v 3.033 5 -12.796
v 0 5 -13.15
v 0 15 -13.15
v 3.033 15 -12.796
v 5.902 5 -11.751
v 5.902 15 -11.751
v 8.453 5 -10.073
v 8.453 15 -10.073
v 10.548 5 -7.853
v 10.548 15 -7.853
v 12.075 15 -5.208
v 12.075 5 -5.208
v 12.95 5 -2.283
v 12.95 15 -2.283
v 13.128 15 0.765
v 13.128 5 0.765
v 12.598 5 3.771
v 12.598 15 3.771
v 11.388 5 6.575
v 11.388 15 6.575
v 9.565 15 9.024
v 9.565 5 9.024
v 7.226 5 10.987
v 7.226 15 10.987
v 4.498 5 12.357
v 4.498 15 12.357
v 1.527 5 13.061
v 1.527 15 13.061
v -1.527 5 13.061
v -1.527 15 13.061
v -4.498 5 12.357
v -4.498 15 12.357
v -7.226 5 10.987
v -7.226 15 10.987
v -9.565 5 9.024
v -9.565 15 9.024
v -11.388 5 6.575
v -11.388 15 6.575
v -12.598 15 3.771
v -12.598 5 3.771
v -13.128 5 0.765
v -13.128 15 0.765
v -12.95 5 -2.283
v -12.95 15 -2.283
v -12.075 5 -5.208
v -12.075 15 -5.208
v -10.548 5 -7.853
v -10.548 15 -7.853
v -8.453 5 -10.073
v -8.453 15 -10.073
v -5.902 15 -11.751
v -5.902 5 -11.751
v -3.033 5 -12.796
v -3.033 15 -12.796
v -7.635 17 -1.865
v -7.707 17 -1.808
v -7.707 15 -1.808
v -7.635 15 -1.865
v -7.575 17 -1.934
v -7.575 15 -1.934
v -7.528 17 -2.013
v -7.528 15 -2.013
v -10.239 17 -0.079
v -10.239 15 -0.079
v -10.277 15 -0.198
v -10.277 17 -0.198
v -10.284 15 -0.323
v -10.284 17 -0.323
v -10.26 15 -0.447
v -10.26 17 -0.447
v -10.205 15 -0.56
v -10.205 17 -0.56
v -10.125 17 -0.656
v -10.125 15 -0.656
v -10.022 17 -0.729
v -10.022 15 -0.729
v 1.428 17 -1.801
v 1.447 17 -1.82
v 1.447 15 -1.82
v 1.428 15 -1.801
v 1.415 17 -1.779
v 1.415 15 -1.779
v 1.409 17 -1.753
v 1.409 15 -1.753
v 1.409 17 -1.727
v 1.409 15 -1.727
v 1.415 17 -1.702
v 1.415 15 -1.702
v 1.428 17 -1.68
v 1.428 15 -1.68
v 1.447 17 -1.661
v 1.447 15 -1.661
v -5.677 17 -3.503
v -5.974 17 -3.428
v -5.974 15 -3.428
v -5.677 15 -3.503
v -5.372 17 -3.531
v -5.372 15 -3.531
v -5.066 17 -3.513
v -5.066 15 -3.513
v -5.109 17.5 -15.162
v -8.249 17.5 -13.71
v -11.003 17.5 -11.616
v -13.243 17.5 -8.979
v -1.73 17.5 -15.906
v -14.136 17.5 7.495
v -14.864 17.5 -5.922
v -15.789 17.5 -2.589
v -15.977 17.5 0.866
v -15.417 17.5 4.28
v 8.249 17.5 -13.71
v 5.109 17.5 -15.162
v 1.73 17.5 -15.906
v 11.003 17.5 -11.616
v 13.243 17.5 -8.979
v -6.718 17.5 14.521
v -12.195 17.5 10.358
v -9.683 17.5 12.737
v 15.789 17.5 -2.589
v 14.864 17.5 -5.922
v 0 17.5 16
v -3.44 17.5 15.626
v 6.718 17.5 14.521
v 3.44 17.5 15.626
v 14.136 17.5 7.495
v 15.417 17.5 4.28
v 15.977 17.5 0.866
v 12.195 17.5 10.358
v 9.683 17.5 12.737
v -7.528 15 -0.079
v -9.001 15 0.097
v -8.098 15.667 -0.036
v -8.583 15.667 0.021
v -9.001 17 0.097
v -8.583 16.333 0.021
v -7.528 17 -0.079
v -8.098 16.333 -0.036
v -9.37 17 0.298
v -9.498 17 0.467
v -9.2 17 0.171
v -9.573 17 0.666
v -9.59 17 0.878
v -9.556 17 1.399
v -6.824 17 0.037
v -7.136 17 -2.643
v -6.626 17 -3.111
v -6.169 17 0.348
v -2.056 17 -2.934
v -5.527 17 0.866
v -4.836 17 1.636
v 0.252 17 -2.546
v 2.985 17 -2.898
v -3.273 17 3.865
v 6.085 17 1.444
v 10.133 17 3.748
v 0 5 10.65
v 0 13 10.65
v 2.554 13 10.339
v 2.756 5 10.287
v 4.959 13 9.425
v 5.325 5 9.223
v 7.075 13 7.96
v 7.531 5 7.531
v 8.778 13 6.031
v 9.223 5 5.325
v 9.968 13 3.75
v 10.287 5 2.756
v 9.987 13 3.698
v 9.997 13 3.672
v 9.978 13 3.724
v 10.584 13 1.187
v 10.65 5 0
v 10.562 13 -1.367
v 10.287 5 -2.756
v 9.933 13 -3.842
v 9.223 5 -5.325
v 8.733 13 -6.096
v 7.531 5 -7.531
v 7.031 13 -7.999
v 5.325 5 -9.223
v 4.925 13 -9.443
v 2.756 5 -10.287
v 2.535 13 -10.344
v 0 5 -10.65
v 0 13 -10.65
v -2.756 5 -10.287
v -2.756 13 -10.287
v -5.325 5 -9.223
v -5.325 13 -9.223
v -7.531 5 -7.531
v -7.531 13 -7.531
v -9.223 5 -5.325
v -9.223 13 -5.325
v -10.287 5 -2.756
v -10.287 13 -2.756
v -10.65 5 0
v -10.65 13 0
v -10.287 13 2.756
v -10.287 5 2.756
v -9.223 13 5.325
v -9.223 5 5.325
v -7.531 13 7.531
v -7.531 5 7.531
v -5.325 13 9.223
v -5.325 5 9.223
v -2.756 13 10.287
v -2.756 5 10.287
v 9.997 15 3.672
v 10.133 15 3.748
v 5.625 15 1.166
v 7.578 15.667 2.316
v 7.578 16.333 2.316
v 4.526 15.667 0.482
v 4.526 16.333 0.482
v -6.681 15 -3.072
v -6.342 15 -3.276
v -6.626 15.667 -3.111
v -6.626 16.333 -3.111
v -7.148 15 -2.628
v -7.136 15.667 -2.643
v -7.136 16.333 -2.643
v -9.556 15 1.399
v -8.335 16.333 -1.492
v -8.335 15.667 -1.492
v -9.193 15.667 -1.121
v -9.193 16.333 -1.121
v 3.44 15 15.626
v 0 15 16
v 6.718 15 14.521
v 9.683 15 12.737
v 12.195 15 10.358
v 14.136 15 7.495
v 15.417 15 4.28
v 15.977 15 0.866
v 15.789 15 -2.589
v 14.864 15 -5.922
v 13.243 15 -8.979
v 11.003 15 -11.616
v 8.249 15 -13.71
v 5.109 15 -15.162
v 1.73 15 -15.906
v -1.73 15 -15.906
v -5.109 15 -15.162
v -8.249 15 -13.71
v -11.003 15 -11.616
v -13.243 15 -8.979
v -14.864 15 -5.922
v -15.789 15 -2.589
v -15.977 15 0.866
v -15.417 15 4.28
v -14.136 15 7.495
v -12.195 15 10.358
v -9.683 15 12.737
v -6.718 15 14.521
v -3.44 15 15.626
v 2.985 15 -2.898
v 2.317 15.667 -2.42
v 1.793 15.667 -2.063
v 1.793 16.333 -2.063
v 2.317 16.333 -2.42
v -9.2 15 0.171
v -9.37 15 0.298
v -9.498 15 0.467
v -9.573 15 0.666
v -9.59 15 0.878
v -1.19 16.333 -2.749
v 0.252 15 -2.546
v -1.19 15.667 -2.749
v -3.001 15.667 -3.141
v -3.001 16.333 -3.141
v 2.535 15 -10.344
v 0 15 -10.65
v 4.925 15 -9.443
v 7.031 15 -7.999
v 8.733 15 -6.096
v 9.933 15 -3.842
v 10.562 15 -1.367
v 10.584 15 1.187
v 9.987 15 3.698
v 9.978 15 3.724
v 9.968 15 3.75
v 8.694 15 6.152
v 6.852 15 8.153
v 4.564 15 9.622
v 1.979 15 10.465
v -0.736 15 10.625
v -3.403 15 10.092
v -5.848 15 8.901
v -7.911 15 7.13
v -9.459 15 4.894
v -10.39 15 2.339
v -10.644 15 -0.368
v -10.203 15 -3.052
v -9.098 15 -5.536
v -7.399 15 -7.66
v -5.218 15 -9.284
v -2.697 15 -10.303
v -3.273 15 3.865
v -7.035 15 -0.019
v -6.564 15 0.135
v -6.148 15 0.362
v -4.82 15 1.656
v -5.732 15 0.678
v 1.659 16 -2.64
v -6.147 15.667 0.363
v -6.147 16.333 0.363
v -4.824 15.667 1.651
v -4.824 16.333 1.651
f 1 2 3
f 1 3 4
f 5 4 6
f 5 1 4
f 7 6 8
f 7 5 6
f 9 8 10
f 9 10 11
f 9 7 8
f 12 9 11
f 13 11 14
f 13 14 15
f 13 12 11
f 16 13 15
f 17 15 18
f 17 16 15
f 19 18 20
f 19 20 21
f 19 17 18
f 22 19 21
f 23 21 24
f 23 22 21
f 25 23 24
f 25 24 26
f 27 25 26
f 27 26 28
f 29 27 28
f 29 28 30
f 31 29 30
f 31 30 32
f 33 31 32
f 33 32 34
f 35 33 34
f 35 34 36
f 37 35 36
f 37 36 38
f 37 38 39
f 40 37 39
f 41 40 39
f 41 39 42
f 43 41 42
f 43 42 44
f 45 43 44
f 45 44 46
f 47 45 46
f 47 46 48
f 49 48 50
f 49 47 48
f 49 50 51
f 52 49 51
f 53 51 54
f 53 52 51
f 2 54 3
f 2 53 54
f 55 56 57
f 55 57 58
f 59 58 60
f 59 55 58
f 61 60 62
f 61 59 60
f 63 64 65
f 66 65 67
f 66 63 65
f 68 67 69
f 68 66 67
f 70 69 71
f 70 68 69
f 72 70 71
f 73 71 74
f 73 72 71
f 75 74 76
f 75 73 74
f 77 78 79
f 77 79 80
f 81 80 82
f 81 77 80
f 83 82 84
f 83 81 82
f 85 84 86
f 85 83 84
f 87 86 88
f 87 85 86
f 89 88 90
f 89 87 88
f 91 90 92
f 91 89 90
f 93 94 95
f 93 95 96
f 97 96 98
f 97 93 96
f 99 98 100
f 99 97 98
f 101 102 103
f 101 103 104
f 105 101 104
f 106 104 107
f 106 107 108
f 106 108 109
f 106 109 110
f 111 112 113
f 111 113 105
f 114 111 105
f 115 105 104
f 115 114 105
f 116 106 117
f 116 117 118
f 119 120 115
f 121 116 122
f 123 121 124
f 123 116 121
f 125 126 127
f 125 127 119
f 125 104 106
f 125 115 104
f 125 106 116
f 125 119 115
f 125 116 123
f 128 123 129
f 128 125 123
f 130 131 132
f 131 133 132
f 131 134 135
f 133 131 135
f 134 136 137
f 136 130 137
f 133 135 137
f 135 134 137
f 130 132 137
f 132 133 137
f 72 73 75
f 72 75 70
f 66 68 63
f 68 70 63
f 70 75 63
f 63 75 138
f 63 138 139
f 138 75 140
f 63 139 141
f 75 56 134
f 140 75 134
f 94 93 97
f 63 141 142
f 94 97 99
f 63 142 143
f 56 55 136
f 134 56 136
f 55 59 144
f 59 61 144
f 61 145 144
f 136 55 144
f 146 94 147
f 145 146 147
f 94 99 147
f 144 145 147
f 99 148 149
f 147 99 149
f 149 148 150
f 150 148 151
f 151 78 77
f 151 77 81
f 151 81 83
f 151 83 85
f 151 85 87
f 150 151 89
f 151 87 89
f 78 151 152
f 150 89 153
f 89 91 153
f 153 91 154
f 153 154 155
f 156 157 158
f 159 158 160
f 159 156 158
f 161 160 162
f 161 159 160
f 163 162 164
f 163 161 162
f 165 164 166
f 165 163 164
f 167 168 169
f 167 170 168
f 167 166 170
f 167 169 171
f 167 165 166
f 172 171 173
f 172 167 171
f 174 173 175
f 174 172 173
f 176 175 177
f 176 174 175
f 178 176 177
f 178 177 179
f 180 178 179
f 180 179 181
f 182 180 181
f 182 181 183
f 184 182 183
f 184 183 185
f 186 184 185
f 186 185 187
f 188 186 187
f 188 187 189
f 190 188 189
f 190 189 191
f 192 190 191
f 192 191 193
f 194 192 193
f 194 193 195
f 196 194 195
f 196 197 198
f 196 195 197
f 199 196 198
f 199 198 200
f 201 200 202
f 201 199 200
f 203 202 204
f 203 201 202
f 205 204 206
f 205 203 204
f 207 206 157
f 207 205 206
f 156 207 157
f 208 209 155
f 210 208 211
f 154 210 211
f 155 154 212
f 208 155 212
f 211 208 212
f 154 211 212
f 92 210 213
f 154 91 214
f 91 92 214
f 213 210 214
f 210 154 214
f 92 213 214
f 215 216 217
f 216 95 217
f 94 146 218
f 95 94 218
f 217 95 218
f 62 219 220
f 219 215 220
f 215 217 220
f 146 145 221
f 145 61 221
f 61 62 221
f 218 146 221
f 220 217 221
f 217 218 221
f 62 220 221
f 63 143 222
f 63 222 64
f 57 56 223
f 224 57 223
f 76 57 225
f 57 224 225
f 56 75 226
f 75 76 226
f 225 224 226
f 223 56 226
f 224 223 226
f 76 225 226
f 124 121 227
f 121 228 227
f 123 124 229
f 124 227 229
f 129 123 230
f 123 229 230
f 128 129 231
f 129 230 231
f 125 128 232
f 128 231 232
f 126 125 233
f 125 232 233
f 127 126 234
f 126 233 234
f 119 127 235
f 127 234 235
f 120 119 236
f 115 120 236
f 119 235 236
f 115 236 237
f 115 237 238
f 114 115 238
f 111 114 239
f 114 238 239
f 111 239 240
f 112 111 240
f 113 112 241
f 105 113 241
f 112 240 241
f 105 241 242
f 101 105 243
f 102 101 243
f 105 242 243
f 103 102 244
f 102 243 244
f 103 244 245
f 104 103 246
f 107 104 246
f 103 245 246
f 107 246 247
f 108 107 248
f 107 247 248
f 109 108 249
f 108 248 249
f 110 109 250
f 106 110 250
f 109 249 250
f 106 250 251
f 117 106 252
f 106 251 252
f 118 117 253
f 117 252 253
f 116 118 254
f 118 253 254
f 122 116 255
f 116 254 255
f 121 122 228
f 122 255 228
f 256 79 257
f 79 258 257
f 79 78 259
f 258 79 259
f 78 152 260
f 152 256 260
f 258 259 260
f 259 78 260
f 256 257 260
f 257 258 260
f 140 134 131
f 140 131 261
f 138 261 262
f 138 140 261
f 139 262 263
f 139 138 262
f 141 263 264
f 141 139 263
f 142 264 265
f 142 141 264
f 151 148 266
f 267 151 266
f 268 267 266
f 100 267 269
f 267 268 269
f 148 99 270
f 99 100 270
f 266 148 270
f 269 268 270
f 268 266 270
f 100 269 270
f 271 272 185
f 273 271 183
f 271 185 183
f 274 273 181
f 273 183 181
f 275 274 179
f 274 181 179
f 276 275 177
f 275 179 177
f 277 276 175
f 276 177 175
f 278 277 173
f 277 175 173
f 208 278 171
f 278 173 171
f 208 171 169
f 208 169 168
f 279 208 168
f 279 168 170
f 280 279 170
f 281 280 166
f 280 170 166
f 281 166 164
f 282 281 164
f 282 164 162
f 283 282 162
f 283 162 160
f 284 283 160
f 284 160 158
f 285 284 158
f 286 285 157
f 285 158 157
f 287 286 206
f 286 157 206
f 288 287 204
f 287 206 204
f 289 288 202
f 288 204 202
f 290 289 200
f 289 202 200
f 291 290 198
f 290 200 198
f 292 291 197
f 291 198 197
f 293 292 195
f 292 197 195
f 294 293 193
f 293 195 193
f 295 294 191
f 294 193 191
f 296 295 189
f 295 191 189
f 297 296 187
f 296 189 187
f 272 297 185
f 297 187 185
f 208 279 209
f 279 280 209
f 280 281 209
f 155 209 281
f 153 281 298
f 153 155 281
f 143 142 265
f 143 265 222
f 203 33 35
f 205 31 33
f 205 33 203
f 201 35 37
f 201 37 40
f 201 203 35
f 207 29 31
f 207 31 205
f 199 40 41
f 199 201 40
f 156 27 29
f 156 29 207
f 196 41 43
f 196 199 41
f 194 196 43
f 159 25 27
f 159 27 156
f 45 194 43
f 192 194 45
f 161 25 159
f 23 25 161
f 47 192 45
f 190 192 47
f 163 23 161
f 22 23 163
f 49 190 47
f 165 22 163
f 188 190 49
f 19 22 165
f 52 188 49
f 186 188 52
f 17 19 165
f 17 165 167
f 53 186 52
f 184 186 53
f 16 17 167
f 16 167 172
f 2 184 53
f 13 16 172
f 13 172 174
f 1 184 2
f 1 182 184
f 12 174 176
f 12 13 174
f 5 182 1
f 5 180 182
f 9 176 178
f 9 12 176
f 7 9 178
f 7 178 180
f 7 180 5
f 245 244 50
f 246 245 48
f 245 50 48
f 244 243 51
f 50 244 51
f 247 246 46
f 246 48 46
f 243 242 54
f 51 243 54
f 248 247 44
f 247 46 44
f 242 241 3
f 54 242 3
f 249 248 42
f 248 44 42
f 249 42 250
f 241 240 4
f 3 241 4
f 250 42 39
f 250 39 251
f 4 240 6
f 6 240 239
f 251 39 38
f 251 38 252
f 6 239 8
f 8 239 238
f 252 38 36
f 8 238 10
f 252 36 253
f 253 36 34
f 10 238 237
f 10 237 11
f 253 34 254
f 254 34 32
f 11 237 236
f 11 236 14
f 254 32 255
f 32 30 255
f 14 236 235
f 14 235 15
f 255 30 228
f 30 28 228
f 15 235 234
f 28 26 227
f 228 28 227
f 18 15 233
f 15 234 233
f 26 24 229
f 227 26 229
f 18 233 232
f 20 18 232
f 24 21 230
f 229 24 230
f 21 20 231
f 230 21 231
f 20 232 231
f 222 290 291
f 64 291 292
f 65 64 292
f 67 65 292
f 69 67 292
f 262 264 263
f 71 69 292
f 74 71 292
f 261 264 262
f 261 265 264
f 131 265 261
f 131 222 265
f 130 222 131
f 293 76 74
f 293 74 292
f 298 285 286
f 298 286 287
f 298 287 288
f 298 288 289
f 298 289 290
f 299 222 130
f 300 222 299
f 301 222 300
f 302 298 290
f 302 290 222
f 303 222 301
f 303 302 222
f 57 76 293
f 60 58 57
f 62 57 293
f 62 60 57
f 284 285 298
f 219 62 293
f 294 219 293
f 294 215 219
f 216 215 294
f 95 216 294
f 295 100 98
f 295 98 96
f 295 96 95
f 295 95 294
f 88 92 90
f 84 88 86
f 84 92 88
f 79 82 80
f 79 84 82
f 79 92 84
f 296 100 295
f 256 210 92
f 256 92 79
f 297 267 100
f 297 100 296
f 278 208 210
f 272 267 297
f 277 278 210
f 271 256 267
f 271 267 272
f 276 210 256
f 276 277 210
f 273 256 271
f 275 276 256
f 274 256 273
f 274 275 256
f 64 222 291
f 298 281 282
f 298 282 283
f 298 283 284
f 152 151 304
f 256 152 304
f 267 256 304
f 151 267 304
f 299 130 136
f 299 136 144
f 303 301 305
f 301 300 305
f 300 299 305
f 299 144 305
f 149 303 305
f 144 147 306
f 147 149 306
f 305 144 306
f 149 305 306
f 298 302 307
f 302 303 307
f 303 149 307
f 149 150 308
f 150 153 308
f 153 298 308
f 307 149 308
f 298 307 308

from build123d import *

# Parameters (mm, degrees)
SKETCH1_R           = 12.65
SKETCH1_R_2         = 10.65
BOSS_EXTRUDE1_DEPTH = 15
SKETCH2_R           = 16
BOSS_EXTRUDE2_DEPTH = 2
CUT_EXTRUDE2_DEPTH  = 3.3
SKETCH5_R           = 16
BOSS_EXTRUDE4_DEPTH = 0.5
SKETCH7_R           = 13.15
SKETCH7_R_2         = 12.65
BOSS_EXTRUDE5_DEPTH = 15
BOSS_EXTRUDE6_DEPTH = 2
SKETCH10_R          = 13.15
CUT_EXTRUDE3_DEPTH  = 5
SKETCH11_R          = 10.65
CUT_EXTRUDE4_DEPTH  = 2


with BuildPart() as part:
    # Sketch1 → Boss-Extrude1 (new body)
    with BuildSketch(Plane(origin=(0, 0, 0), x_dir=(1, 0, 0), z_dir=(0, 1, 0))):
        with Locations(Location((0, 0, 0), (0, 0, 270))):
            Circle(SKETCH1_R)
        with Locations(Location((0, 0, 0), (0, 0, 270))):
            Circle(SKETCH1_R_2, mode=Mode.SUBTRACT)
    extrude(amount=BOSS_EXTRUDE1_DEPTH)

    # Sketch2 → Boss-Extrude2 (add)
    with BuildSketch(Plane(origin=(0, 15, 0), x_dir=(1, 0, 0), z_dir=(0, 1, 0))):
        with Locations(Location((0, 0, 0), (0, 0, 270))):
            Circle(SKETCH2_R)
    extrude(amount=BOSS_EXTRUDE2_DEPTH)

    # Sketch4 → Cut-Extrude2 (cut)
    with BuildSketch(Plane(origin=(0, 17, 0), x_dir=(1, 0, 0), z_dir=(0, 1, 0))):
        with BuildLine():
            ThreePointArc((-7.706902754, 1.808391197), (-7.603132783, 1.898306548), (-7.527733553, 2.013058165))
            add(Edge.make_bspline(
                [(-5.973562898, 3.427644412), (-6.705514393, 3.181828062), (-7.188037686, 2.727956598), (-7.527733553, 2.013058165)],
                knots=[0.175947617, 0.175947617, 0.175947617, 0.175947617, 0.967261409, 0.967261409, 0.967261409, 0.967261409], degree=3))
            ThreePointArc((-5.973562898, 3.427644412), (-5.5249107, 3.522844059), (-5.066368092, 3.513333887))
            add(Edge.make_bspline(
                [(0.252246957, 2.546498923), (-0.967265157, 2.585544634), (-2.911735898, 3.219251878), (-5.066368092, 3.513333887)],
                knots=[0, 0, 0, 0, 0.944652434, 0.944652434, 0.944652434, 0.944652434], degree=3))
            add(Edge.make_bspline(
                [(2.984843767, 2.898010668), (1.699544821, 2.557369315), (0.252246957, 2.546498923)],
                knots=[0, 0, 0, 1, 1, 1], degree=2))
            add(Edge.make_bspline(
                [(1.446576088, 1.819612756), (1.692233604, 2.009446504), (2.255675441, 2.356061237), (2.984843767, 2.898010668)],
                knots=[0.144955644, 0.144955644, 0.144955644, 0.144955644, 1, 1, 1, 1], degree=3))
            ThreePointArc((1.446576088, 1.819612756), (1.407722351, 1.740462389), (1.446612546, 1.661329929))
            add(Edge.make_bspline(
                [(10.133171434, -3.748192499), (7.984235622, -2.549090336), (4.381903984, -0.604779848), (1.446612546, 1.661329929)],
                knots=[0.010904337, 0.010904337, 0.010904337, 0.010904337, 1, 1, 1, 1], degree=3))
            Line((10.133171434, -3.748192499), (-3.273421479, -3.865089106))
            add(Edge.make_bspline(
                [(-7.527733553, 0.078549357), (-6.021351328, 0.034537537), (-5.034172952, -1.161131544), (-3.273421479, -3.865089106)],
                knots=[0, 0, 0, 0, 1, 1, 1, 1], degree=3))
            add(Edge.make_bspline(
                [(-9.001359598, -0.096644929), (-8.609511327, -0.010984191), (-8.147442934, 0.043060836), (-7.527733553, 0.078549357)],
                knots=[0.366671919, 0.366671919, 0.366671919, 0.366671919, 1, 1, 1, 1], degree=3))
            ThreePointArc((-9.001359598, -0.096644929), (-9.440291534, -0.378150341), (-9.589622684, -0.877756935))
            Line((-9.589622684, -0.877756935), (-9.555879634, -1.399381307))
            Line((-9.555879634, -1.399381307), (-10.239201334, 0.078549357))
            ThreePointArc((-10.239201334, 0.078549357), (-10.259690649, 0.446534823), (-10.022461777, 0.728590805))
            add(Edge.make_bspline(
                [(-7.706902754, 1.808391197), (-8.132820465, 1.531622413), (-9.295077766, 1.120365549), (-10.022461777, 0.728590805)],
                knots=[0.10934646, 0.10934646, 0.10934646, 0.10934646, 0.840811763, 0.840811763, 0.840811763, 0.840811763], degree=3))
        make_face()
        with BuildLine():
            add(Edge.make_bspline(
                [(-6.583224352, 1.672229032), (-6.265045802, 1.812995825), (-5.554174981, 1.756337096)],
                knots=[0, 0, 0, 1, 1, 1], degree=2))
            ThreePointArc((-5.554174981, 1.756337096), (-5.456989048, 1.782455761), (-5.398182511, 1.864120205))
            add(Edge.make_bspline(
                [(-5.398182511, 1.864120205), (-5.299215588, 2.205704199), (-5.024689184, 2.452345347)],
                knots=[0, 0, 0, 1, 1, 1], degree=2))
            add(Edge.make_bspline(
                [(-5.024689184, 2.452345347), (-5.951430889, 2.228368239), (-6.944366579, 2.126753853)],
                knots=[0, 0, 0, 1, 1, 1], degree=2))
            add(Edge.make_bspline(
                [(-6.944366579, 2.126753853), (-6.855792408, 2.003769494), (-6.788085292, 1.768000929)],
                knots=[0, 0, 0, 1, 1, 1], degree=2))
            ThreePointArc((-6.788085292, 1.768000929), (-6.707437973, 1.673519717), (-6.583224352, 1.672229032))
        make_face(mode=Mode.SUBTRACT)
        with BuildLine():
            ThreePointArc((-6.788085292, 1.768000929), (-6.707437973, 1.673519717), (-6.583224352, 1.672229032))
            add(Edge.make_bspline(
                [(-6.583224352, 1.672229032), (-6.265045802, 1.812995825), (-5.554174981, 1.756337096)],
                knots=[0, 0, 0, 1, 1, 1], degree=2))
            ThreePointArc((-5.554174981, 1.756337096), (-5.456989048, 1.782455761), (-5.398182511, 1.864120205))
            add(Edge.make_bspline(
                [(-5.398182511, 1.864120205), (-5.299215588, 2.205704199), (-5.024689184, 2.452345347)],
                knots=[0, 0, 0, 1, 1, 1], degree=2))
            add(Edge.make_bspline(
                [(-5.024689184, 2.452345347), (-5.951430889, 2.228368239), (-6.944366579, 2.126753853)],
                knots=[0, 0, 0, 1, 1, 1], degree=2))
            add(Edge.make_bspline(
                [(-6.944366579, 2.126753853), (-6.855792408, 2.003769494), (-6.788085292, 1.768000929)],
                knots=[0, 0, 0, 1, 1, 1], degree=2))
        make_face()
    extrude(amount=-CUT_EXTRUDE2_DEPTH, mode=Mode.SUBTRACT)

    # Sketch5 → Boss-Extrude4 (add)
    with BuildSketch(Plane(origin=(0, 17, 0), x_dir=(1, 0, 0), z_dir=(0, 1, 0))):
        with Locations(Location((0, 0, 0), (0, 0, 270))):
            Circle(SKETCH5_R)
    extrude(amount=BOSS_EXTRUDE4_DEPTH)

    # Sketch7 → Boss-Extrude5 (add)
    with BuildSketch(Plane.XZ):
        with Locations(Location((0, 0, 0), (0, 0, 270))):
            Circle(SKETCH7_R)
        Circle(SKETCH7_R_2, mode=Mode.SUBTRACT)
    extrude(amount=-BOSS_EXTRUDE5_DEPTH)

    # Sketch8 → Boss-Extrude6 (add)
    with BuildSketch(Plane.XZ.offset(-15)):
        with BuildLine():
            add(Edge.make_bspline(
                [(9.996866834, 3.672213707), (10.042920822, 3.697861429), (10.088362097, 3.723188972), (10.133171434, 3.748192499)],
                knots=[0.979375502, 0.979375502, 0.979375502, 0.979375502, 1, 1, 1, 1], degree=3))
            Line((10.133171434, 3.748192499), (9.9680871, 3.749631925))
            Line((9.9680871, 3.749631925), (-3.273421479, 3.865089106))
            add(Edge.make_bspline(
                [(-3.273421479, 3.865089106), (-5.034172952, 1.161131544), (-6.021351328, -0.034537537), (-7.527733553, -0.078549357)],
                knots=[0, 0, 0, 0, 1, 1, 1, 1], degree=3))
            add(Edge.make_bspline(
                [(-7.527733553, -0.078549357), (-8.147442934, -0.043060836), (-8.609511327, 0.010984191), (-9.001359598, 0.096644929)],
                knots=[0.366671919, 0.366671919, 0.366671919, 0.366671919, 1, 1, 1, 1], degree=3))
            ThreePointArc((-9.001359598, 0.096644929), (-9.440291534, 0.378150341), (-9.589622684, 0.877756935))
            Line((-9.589622684, 0.877756935), (-9.555879634, 1.399381307))
            Line((-9.555879634, 1.399381307), (-10.239201334, -0.078549357))
            ThreePointArc((-10.239201334, -0.078549357), (-10.259690649, -0.446534823), (-10.022461777, -0.728590805))
            add(Edge.make_bspline(
                [(-10.022461777, -0.728590805), (-9.295077766, -1.120365549), (-8.132820465, -1.531622413), (-7.706902754, -1.808391197)],
                knots=[0.10934646, 0.10934646, 0.10934646, 0.10934646, 0.840811763, 0.840811763, 0.840811763, 0.840811763], degree=3))
            ThreePointArc((-7.706902754, -1.808391197), (-7.603132783, -1.898306548), (-7.527733553, -2.013058165))
            add(Edge.make_bspline(
                [(-7.527733553, -2.013058165), (-7.188037686, -2.727956598), (-6.705514393, -3.181828062), (-5.973562898, -3.427644412)],
                knots=[0.175947617, 0.175947617, 0.175947617, 0.175947617, 0.967261409, 0.967261409, 0.967261409, 0.967261409], degree=3))
            ThreePointArc((-5.973562898, -3.427644412), (-5.5249107, -3.522844059), (-5.066368092, -3.513333887))
            add(Edge.make_bspline(
                [(-5.066368092, -3.513333887), (-2.911735898, -3.219251878), (-0.967265157, -2.585544634), (0.252246944, -2.546498923)],
                knots=[0, 0, 0, 0, 0.944652434, 0.944652434, 0.944652434, 0.944652434], degree=3))
            add(Edge.make_bspline(
                [(0.252246944, -2.546498923), (1.699544832, -2.557369314), (2.984843797, -2.898010676)],
                knots=[0, 0, 0, 1, 1, 1], degree=2))
            add(Edge.make_bspline(
                [(2.984843797, -2.898010676), (2.255675441, -2.356061237), (1.692233604, -2.009446504), (1.446576086, -1.819612759)],
                knots=[0.144955644, 0.144955644, 0.144955644, 0.144955644, 1, 1, 1, 1], degree=3))
            ThreePointArc((1.446576086, -1.819612759), (1.407722347, -1.740462389), (1.446612544, -1.661329926))
            add(Edge.make_bspline(
                [(1.446612544, -1.661329926), (4.320697658, 0.557527214), (7.834294925, 2.467865384), (9.996866834, 3.672213707)],
                knots=[0.010904337, 0.010904337, 0.010904337, 0.010904337, 0.979375502, 0.979375502, 0.979375502, 0.979375502], degree=3))
        make_face()
        with BuildLine():
            Line((-3.273421479, 3.865089106), (9.9680871, 3.749631925))
            ThreePointArc((9.9680871, 3.749631925), (-9.982552018, -3.710950716), (9.996866834, 3.672213707))
            add(Edge.make_bspline(
                [(1.446612544, -1.661329926), (4.320697658, 0.557527214), (7.834294925, 2.467865384), (9.996866834, 3.672213707)],
                knots=[0.010904337, 0.010904337, 0.010904337, 0.010904337, 0.979375502, 0.979375502, 0.979375502, 0.979375502], degree=3))
            ThreePointArc((1.446612544, -1.661329926), (1.407722347, -1.740462389), (1.446576086, -1.819612759))
            add(Edge.make_bspline(
                [(2.984843797, -2.898010676), (2.255675441, -2.356061237), (1.692233604, -2.009446504), (1.446576086, -1.819612759)],
                knots=[0.144955644, 0.144955644, 0.144955644, 0.144955644, 1, 1, 1, 1], degree=3))
            add(Edge.make_bspline(
                [(0.252246944, -2.546498923), (1.699544832, -2.557369314), (2.984843797, -2.898010676)],
                knots=[0, 0, 0, 1, 1, 1], degree=2))
            add(Edge.make_bspline(
                [(-5.066368092, -3.513333887), (-2.911735898, -3.219251878), (-0.967265157, -2.585544634), (0.252246944, -2.546498923)],
                knots=[0, 0, 0, 0, 0.944652434, 0.944652434, 0.944652434, 0.944652434], degree=3))
            ThreePointArc((-5.066368092, -3.513333887), (-5.5249107, -3.522844059), (-5.973562898, -3.427644412))
            add(Edge.make_bspline(
                [(-7.527733553, -2.013058165), (-7.188037686, -2.727956598), (-6.705514393, -3.181828062), (-5.973562898, -3.427644412)],
                knots=[0.175947617, 0.175947617, 0.175947617, 0.175947617, 0.967261409, 0.967261409, 0.967261409, 0.967261409], degree=3))
            ThreePointArc((-7.527733553, -2.013058165), (-7.603132783, -1.898306548), (-7.706902754, -1.808391197))
            add(Edge.make_bspline(
                [(-10.022461777, -0.728590805), (-9.295077766, -1.120365549), (-8.132820465, -1.531622413), (-7.706902754, -1.808391197)],
                knots=[0.10934646, 0.10934646, 0.10934646, 0.10934646, 0.840811763, 0.840811763, 0.840811763, 0.840811763], degree=3))
            ThreePointArc((-10.022461777, -0.728590805), (-10.259690649, -0.446534823), (-10.239201334, -0.078549357))
            Line((-10.239201334, -0.078549357), (-9.555879634, 1.399381307))
            Line((-9.555879634, 1.399381307), (-9.589622684, 0.877756935))
            ThreePointArc((-9.589622684, 0.877756935), (-9.440291534, 0.378150341), (-9.001359598, 0.096644929))
            add(Edge.make_bspline(
                [(-7.527733553, -0.078549357), (-8.147442934, -0.043060836), (-8.609511327, 0.010984191), (-9.001359598, 0.096644929)],
                knots=[0.366671919, 0.366671919, 0.366671919, 0.366671919, 1, 1, 1, 1], degree=3))
            add(Edge.make_bspline(
                [(-3.273421479, 3.865089106), (-5.034172952, 1.161131544), (-6.021351328, -0.034537537), (-7.527733553, -0.078549357)],
                knots=[0, 0, 0, 0, 1, 1, 1, 1], degree=3))
        make_face()
    extrude(amount=BOSS_EXTRUDE6_DEPTH)

    # Sketch10 → Cut-Extrude3 (cut)
    with BuildSketch(Plane.XZ):
        with Locations(Location((0, 0, 0), (0, 0, 270))):
            Circle(SKETCH10_R)
    extrude(amount=-CUT_EXTRUDE3_DEPTH, mode=Mode.SUBTRACT)

    # Sketch11 → Cut-Extrude4 (cut)
    with BuildSketch(Plane.XZ.offset(-13)):
        with Locations(Location((0, 0, 0), (0, 0, 270))):
            Circle(SKETCH11_R)
    extrude(amount=-CUT_EXTRUDE4_DEPTH, mode=Mode.SUBTRACT)


solid = part.part
